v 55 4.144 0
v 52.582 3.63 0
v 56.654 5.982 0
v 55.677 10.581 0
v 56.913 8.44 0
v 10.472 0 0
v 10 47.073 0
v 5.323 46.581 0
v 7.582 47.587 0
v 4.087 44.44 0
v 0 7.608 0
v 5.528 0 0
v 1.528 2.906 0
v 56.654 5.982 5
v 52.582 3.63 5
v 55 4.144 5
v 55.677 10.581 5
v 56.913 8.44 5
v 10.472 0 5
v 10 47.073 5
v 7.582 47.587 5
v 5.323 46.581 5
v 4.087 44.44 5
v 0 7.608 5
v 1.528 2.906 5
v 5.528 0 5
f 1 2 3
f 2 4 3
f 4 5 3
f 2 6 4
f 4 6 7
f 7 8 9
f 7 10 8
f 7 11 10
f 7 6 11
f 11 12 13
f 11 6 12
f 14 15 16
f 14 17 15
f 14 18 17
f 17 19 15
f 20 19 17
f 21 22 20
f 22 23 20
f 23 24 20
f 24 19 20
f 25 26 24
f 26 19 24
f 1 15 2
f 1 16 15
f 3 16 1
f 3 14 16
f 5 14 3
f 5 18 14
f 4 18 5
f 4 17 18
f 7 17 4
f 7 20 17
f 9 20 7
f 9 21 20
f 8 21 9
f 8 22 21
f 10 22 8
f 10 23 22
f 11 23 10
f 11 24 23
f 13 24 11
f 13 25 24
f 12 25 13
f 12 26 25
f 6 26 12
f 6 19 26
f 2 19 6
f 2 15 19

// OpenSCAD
$fn = 32;

// ----------------------------------------------------------------------
// Lever arm: two bosses 16 and 8 mm, 45 mm between centres
// ----------------------------------------------------------------------

// --- parameters (mm) ---
profile_height = 5;       // extrusion height
profile_points = 13;      // points of the closed outline

profile = [[0, 7.608], [1.528, 2.906], [5.528, 0], [10.472, 0], [52.582, 3.63], [55, 4.144], [56.654, 5.982], [56.913, 8.44], [55.677, 10.581], [10, 47.073], [7.582, 47.587], [5.323, 46.581], [4.087, 44.44]];  // single closed polygon, 13 points, counter clockwise

// --- the one profile operation ---
linear_extrude(height = profile_height) polygon(points = profile);
